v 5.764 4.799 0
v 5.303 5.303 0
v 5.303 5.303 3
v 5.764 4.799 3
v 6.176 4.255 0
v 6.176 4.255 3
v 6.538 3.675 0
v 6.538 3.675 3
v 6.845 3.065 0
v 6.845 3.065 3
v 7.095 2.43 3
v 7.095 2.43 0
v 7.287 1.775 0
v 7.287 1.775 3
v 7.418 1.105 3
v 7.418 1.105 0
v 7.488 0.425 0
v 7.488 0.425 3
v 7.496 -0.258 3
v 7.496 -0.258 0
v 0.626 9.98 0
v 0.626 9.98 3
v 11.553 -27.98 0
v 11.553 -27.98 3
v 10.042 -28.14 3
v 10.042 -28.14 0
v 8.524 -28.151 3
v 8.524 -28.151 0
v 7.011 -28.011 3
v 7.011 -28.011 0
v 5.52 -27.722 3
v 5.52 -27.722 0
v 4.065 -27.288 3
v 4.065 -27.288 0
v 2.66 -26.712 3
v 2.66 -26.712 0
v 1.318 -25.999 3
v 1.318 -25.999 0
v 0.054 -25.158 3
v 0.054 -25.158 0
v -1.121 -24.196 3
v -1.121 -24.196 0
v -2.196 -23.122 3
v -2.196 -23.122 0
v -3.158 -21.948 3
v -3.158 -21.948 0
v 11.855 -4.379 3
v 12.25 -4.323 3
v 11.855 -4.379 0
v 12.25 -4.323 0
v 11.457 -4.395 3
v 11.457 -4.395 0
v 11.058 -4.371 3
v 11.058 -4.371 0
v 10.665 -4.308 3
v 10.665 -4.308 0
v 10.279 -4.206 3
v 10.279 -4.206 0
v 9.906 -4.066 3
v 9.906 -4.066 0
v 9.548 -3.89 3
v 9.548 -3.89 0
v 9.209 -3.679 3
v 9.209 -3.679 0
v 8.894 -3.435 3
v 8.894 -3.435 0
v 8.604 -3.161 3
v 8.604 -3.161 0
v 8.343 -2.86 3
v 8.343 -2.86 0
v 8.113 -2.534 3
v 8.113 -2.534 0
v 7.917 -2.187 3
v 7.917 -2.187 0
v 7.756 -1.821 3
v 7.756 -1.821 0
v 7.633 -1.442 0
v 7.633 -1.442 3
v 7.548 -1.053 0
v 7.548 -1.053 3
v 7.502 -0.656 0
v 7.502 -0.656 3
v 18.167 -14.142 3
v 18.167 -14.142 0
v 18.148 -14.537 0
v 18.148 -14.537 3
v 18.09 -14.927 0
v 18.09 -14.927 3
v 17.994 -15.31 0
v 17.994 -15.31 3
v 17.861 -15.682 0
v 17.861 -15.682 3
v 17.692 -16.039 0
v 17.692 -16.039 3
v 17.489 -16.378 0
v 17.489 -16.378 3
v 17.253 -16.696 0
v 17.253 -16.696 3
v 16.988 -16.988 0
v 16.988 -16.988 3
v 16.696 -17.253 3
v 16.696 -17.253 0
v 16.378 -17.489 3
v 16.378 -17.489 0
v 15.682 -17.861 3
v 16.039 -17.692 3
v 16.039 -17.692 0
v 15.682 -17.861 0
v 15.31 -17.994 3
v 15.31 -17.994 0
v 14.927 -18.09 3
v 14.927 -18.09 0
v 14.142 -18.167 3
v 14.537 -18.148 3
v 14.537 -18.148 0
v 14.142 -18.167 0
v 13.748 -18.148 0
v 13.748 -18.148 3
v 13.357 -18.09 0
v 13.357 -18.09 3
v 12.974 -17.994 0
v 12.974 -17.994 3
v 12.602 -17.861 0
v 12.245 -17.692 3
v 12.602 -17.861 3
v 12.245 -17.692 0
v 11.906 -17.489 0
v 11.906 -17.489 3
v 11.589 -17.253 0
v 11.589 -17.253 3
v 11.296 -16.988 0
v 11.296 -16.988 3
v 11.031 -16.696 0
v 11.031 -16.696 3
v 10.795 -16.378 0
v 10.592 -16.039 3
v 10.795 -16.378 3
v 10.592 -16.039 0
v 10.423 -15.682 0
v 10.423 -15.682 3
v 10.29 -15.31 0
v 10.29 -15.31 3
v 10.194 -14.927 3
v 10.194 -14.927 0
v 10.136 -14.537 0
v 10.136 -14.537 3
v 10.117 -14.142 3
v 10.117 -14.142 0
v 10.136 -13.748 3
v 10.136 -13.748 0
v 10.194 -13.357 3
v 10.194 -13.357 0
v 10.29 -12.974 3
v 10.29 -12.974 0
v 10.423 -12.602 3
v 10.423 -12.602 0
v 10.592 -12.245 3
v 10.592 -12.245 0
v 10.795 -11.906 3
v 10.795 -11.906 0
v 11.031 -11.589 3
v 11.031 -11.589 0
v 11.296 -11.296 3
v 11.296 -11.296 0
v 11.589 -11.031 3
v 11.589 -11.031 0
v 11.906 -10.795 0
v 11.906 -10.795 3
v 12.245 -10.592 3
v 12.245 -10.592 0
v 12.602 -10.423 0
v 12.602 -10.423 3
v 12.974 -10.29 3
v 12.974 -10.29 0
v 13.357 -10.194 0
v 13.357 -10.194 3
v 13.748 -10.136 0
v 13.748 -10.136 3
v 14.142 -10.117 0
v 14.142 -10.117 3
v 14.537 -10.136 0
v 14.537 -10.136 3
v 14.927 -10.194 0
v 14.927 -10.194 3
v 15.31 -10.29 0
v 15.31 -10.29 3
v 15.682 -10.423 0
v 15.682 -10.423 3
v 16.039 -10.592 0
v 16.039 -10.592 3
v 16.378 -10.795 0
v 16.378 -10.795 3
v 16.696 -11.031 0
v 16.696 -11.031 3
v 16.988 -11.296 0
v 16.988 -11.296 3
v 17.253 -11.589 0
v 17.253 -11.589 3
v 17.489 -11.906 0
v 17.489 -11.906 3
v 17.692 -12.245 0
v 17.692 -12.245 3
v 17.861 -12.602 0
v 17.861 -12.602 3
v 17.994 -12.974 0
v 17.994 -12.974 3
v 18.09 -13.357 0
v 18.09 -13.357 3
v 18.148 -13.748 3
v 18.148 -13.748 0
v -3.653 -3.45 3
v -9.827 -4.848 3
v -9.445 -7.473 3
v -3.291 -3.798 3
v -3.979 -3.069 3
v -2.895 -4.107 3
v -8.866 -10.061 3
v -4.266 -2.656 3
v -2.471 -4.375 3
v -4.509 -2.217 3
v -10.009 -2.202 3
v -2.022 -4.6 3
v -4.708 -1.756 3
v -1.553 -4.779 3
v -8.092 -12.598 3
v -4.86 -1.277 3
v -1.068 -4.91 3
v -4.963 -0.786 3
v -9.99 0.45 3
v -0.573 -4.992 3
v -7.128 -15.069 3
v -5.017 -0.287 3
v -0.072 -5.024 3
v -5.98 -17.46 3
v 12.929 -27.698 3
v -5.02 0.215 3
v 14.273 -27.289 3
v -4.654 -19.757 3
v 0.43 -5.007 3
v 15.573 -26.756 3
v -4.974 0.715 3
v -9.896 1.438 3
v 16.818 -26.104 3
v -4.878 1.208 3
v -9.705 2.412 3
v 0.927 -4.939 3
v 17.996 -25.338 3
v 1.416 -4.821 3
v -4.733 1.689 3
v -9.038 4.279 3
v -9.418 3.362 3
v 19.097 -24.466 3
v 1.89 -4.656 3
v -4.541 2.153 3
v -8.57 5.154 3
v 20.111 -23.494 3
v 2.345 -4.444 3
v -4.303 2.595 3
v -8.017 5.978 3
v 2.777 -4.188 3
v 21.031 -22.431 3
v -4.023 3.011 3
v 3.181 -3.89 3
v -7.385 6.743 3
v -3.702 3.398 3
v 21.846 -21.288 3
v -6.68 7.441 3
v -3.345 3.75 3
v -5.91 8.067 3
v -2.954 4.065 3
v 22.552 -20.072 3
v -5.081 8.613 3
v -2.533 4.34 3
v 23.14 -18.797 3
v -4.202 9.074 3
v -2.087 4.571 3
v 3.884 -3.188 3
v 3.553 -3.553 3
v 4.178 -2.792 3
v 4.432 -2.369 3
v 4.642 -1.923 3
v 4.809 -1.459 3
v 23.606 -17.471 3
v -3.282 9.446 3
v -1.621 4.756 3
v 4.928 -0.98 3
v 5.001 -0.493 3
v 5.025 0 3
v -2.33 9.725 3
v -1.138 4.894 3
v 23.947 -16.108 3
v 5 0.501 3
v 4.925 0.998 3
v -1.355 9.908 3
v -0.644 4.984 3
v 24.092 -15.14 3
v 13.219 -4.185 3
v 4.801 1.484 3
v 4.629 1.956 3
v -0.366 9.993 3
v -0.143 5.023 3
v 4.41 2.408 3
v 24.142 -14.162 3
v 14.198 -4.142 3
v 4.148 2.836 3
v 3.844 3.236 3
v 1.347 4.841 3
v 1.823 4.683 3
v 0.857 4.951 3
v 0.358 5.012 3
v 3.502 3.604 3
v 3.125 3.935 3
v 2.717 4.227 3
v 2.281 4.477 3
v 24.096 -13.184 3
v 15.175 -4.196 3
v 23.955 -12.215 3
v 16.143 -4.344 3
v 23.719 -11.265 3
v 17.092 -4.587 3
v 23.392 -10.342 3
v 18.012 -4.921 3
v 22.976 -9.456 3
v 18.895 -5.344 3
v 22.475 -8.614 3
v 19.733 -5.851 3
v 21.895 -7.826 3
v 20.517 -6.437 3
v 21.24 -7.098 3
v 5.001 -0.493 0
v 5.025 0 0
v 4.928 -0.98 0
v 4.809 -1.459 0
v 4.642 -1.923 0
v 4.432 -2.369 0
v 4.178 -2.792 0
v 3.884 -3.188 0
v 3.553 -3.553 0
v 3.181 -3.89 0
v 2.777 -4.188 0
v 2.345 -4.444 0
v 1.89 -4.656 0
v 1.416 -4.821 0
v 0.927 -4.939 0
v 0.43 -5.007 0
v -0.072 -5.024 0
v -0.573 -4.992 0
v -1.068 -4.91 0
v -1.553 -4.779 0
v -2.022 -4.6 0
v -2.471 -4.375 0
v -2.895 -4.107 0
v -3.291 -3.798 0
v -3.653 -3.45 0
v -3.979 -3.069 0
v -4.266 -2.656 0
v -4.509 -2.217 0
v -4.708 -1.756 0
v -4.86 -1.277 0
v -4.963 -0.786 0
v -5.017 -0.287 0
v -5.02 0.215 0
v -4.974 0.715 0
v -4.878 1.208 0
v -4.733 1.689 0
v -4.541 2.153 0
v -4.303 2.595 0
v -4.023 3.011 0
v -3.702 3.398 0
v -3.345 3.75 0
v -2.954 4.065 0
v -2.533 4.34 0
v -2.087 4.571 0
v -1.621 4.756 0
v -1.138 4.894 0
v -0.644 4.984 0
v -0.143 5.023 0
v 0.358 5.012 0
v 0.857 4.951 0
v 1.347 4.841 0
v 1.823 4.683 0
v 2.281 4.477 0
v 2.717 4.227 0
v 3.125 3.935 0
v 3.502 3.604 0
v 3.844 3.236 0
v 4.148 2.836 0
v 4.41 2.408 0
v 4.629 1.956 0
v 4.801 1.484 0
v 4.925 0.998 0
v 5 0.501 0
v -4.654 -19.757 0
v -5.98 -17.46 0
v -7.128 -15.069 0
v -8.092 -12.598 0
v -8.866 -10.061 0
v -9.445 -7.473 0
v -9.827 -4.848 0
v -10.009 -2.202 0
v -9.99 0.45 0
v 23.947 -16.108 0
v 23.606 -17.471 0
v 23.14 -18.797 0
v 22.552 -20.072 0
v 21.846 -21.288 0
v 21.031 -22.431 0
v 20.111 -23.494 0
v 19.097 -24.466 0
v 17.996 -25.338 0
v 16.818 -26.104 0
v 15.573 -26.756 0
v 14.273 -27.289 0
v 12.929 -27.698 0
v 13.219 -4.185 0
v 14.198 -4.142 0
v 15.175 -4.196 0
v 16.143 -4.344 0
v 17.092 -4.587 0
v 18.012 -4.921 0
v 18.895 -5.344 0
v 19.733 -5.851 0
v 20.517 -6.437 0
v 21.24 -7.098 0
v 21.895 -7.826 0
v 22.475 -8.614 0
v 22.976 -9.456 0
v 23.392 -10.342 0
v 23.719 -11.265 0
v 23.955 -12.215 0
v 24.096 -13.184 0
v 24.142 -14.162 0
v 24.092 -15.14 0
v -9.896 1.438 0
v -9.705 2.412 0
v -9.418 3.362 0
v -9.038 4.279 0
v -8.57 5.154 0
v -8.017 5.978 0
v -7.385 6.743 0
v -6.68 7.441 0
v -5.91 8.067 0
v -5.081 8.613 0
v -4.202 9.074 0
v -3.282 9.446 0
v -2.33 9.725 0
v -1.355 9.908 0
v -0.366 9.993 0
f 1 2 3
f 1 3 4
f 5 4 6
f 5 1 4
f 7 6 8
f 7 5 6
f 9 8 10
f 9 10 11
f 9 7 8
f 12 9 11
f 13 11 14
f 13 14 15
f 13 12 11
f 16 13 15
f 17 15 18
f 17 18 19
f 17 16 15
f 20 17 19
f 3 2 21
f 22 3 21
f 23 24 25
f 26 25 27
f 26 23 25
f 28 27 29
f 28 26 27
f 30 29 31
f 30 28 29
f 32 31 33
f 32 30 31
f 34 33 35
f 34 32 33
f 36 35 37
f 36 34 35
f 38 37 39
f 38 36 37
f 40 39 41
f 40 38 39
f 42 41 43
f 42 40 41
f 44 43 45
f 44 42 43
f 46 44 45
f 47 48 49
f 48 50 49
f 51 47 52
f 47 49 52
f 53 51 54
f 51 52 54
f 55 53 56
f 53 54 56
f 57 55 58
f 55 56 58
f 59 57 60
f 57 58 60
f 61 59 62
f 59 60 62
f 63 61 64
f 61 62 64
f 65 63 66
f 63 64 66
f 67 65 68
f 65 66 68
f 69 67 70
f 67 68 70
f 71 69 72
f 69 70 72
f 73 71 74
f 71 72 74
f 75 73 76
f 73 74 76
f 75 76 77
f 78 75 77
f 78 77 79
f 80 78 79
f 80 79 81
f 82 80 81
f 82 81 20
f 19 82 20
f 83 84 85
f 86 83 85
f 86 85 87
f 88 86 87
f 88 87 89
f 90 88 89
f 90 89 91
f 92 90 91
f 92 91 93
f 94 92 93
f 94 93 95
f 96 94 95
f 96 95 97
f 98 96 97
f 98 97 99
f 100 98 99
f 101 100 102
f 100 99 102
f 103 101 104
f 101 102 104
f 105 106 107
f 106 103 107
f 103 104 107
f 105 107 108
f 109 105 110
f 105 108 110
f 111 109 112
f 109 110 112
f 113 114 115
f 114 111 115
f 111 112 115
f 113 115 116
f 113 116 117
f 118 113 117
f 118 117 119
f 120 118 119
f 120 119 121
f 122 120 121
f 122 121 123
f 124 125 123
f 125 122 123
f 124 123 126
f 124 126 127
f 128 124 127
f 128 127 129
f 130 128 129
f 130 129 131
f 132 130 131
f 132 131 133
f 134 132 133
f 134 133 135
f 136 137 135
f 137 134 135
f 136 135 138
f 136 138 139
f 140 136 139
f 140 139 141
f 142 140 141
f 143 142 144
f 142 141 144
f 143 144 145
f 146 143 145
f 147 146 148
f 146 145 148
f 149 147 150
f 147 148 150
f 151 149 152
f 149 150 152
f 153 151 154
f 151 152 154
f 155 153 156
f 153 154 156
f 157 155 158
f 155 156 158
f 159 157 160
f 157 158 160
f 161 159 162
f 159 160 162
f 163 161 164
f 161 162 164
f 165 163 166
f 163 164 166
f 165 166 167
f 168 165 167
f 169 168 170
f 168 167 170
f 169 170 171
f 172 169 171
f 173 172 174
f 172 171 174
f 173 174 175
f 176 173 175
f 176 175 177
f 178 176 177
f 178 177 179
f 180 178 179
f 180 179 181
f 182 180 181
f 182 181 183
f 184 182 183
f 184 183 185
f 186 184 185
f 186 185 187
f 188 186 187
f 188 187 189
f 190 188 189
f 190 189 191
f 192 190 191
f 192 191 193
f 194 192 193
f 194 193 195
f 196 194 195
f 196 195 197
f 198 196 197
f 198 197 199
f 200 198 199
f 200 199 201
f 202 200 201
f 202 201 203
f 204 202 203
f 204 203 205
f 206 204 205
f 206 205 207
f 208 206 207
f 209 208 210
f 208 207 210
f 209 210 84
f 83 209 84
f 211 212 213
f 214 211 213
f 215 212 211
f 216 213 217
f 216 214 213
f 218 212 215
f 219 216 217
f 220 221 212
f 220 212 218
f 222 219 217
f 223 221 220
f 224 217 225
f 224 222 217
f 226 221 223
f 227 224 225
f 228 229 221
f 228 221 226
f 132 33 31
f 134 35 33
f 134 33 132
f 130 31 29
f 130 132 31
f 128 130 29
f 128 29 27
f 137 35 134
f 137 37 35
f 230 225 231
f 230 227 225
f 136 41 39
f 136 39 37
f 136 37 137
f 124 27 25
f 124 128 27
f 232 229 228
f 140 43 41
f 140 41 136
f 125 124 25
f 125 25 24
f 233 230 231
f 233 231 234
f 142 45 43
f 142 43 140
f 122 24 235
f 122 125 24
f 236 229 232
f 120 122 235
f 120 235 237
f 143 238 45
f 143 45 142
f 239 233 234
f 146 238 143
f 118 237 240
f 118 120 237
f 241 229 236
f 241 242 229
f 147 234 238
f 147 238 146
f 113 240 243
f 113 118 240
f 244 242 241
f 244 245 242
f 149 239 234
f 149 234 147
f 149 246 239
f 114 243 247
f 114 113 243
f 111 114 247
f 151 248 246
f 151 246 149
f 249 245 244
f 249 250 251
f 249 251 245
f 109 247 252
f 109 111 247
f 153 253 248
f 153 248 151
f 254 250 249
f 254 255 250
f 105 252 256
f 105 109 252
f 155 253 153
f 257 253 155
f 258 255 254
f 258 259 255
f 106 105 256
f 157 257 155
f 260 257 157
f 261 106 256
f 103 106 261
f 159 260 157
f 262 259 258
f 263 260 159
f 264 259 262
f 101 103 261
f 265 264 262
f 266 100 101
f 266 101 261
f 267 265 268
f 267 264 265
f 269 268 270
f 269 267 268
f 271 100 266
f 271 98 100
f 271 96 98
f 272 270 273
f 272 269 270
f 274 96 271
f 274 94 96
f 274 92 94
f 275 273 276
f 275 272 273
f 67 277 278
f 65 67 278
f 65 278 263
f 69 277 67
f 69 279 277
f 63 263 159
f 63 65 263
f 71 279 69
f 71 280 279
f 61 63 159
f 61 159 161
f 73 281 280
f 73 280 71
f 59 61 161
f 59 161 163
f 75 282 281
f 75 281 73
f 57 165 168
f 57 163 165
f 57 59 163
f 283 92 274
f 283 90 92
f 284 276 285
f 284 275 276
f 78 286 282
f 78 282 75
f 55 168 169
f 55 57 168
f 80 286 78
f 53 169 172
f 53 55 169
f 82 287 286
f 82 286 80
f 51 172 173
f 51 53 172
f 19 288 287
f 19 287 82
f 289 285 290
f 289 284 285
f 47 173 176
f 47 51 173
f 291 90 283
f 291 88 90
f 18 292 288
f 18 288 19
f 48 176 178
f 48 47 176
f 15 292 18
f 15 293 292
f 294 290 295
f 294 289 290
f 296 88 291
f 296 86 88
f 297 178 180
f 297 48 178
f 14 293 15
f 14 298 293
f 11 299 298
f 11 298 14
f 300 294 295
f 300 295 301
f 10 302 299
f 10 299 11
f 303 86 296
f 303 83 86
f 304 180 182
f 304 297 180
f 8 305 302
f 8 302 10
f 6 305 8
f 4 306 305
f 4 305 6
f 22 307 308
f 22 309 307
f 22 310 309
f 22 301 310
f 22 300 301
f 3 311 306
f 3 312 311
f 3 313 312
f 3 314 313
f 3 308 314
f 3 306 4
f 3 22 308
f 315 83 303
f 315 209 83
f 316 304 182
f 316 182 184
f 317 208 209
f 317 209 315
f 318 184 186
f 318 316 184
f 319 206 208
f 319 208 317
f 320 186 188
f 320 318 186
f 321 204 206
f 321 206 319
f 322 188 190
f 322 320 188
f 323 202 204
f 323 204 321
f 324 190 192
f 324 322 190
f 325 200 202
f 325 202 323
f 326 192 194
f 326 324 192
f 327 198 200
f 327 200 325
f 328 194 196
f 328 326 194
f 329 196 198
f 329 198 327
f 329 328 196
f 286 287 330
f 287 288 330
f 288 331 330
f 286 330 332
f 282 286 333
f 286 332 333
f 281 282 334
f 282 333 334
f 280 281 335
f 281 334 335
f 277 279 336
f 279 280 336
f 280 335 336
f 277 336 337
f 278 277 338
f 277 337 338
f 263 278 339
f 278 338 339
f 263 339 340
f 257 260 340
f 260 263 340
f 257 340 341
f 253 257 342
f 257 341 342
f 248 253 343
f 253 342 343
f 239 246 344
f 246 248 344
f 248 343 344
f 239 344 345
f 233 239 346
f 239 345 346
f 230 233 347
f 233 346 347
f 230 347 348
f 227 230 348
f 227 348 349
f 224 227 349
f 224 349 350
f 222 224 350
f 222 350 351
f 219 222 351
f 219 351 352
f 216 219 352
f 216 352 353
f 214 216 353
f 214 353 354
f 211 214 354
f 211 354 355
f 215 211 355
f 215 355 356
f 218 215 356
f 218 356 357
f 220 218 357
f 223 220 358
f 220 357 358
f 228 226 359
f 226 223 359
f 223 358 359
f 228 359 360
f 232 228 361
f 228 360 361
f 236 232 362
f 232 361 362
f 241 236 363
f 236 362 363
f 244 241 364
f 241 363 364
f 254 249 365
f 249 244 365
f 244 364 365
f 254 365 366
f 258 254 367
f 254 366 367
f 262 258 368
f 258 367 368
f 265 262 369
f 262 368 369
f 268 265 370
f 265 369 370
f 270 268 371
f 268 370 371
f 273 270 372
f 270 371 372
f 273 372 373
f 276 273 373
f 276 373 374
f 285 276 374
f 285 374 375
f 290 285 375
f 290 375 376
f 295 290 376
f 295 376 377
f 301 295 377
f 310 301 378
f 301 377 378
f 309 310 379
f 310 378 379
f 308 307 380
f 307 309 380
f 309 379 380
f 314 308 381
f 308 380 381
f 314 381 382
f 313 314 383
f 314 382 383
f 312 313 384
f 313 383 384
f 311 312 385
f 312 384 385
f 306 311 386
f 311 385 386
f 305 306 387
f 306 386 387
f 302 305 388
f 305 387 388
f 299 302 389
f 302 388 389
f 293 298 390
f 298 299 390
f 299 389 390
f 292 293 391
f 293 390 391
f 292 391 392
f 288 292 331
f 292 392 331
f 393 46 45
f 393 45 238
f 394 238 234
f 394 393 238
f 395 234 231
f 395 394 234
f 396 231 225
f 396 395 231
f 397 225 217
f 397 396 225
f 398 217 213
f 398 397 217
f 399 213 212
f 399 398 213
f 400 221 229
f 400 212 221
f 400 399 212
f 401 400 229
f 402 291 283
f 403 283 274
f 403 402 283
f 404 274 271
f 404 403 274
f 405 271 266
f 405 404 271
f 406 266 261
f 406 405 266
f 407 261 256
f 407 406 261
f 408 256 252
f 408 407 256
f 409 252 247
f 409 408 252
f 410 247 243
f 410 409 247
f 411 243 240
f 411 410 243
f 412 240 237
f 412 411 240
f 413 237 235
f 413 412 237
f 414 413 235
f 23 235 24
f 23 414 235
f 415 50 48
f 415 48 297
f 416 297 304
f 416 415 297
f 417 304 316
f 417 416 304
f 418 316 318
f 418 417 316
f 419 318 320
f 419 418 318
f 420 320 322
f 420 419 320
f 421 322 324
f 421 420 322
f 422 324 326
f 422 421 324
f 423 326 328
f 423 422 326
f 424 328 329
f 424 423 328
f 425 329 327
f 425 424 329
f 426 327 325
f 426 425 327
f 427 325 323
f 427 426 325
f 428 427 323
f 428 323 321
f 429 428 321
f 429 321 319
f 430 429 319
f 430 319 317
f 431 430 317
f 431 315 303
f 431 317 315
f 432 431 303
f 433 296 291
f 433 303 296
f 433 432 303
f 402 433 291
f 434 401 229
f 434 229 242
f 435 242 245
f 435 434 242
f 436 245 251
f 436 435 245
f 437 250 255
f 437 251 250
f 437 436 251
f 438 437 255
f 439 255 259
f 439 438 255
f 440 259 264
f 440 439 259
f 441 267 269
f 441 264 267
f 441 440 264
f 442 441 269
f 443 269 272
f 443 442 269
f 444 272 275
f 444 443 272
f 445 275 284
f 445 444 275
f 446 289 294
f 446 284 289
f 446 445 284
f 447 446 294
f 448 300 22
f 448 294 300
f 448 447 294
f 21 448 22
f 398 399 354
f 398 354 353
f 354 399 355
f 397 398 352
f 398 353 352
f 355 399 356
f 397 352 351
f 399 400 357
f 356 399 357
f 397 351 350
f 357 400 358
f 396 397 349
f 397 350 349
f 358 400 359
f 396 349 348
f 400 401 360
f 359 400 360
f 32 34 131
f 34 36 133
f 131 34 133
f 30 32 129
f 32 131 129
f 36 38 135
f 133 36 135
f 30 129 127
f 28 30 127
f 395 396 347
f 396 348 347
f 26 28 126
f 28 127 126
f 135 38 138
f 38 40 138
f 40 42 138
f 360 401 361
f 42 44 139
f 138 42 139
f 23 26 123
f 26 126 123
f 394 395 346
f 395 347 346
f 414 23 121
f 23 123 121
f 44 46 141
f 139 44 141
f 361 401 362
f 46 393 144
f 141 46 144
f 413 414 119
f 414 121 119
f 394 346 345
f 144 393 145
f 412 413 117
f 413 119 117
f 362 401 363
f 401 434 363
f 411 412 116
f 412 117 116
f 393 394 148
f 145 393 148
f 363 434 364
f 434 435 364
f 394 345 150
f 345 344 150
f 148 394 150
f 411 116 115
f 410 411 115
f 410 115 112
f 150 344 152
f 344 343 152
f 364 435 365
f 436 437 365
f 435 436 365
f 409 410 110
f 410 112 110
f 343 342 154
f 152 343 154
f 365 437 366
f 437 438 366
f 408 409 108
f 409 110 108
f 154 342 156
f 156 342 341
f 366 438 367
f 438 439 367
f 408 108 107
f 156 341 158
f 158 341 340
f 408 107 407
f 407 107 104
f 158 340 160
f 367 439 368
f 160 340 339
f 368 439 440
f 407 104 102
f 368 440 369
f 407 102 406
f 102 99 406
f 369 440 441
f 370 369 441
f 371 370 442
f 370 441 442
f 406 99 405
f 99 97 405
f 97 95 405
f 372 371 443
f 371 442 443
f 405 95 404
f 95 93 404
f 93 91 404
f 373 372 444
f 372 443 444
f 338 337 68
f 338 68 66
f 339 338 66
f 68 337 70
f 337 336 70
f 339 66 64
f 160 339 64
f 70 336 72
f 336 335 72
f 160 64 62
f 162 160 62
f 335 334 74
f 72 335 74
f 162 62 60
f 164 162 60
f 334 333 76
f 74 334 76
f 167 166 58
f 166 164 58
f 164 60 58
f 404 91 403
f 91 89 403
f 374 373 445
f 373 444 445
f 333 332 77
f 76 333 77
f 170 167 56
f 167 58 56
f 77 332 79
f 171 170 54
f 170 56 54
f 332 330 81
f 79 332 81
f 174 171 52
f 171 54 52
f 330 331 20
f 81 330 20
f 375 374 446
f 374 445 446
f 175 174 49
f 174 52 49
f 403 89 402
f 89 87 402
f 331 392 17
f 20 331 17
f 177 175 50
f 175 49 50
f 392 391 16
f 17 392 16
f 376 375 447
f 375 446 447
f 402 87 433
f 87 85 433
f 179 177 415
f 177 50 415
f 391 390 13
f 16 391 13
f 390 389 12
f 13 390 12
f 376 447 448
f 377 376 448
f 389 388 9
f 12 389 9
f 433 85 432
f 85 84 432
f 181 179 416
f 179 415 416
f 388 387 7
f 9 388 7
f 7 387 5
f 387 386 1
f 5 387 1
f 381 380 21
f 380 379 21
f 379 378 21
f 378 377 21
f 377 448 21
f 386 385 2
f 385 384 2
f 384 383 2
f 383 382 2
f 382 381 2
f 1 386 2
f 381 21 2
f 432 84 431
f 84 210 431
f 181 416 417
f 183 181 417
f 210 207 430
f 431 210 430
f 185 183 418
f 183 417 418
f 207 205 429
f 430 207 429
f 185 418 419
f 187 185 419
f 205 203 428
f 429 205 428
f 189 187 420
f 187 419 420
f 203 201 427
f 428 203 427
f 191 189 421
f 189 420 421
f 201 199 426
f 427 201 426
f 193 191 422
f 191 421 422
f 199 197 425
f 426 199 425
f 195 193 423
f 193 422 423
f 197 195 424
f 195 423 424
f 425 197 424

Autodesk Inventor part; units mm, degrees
ref_plane "YZ Plane" through (0, 0, 0) normal (1, 0, 0) x (0, 1, 0)
ref_plane "XZ Plane" through (0, 0, 0) normal (0, 1, 0) x (-1, 0, 0)
ref_plane "XY Plane" through (0, 0, 0) normal (0, 0, 1) x (1, 0, 0)
sketch "スケッチ1" plane through (0, 0, 0) normal (0, 0, 1) x (1, 0, 0)
  circle A0 centre (0, 0) radius 5.025
  circle A1 centre (0, 0) radius 10
  line L0 (0, 0) -> (14.1421, -14.1421)
  line L1 (0, 0) -> (20, 0) construction
  line L2 (0, 0) -> (14.1421, -14.1421) construction
  line L3 (-7.0711, -7.0711) -> (7.0711, -21.2132)
  line L4 (21.2132, -7.0711) -> (7.0711, 7.0711)
  arc A2 (7.0711, 7.0711) -> (-7.0711, -7.0711) centre (0, 0) ccw
  arc A3 (7.0711, -21.2132) -> (21.2132, -7.0711) centre (14.1421, -14.1421) ccw
  circle A4 centre (14.1421, -14.1421) radius 4.025
  circle A5 centre (14.1421, -14.1421) radius 13
  circle A6 centre (14.1421, -14.1421) radius 14
  line L5 (4.2426, -24.0416) -> (21.0227, -40.8217)
  line L6 (21.0227, -40.8217) -> (47.0109, -27.2119)
  line L7 (47.0109, -27.2119) -> (24.0416, -4.2426)
  arc A7 (12.0122, -27.9792) -> (10.7234, -30.5224) centre (11.784, -29.4617) ccw
  line L8 (-8.3867, -5.4464) -> (8.8712, -32.0212)
  arc A8 (10.5855, -29.4018) -> (10.585, -29.4134) centre (11.784, -29.4617) ccw
  line L9 (4.2426, -24.0416) -> (21.0227, -40.8217)
  line L10 (21.0227, -40.8217) -> (47.0109, -27.2119)
  line L11 (47.0109, -27.2119) -> (24.0416, -4.2426)
  arc A9 (8.8712, -32.0212) -> (10.7228, -30.5218) centre (9.8758, -31.3688) ccw
  arc A10 (11.5527, -27.9797) -> (10.7228, -30.5218) centre (11.784, -29.4617) ccw
  arc A11 (11.5527, -27.9797) -> (23.9469, -16.1083) centre (9.2397, -13.1591) ccw
  arc A12 (-9.9898, 0.4505) -> (9.3407, -32.4405) centre (24.9746, -1.1263) ccw
  arc A13 (21.2132, -7.0711) -> (7.0711, -21.2132) centre (14.1421, -14.1421) ccw
  arc A14 (7.4956, -0.2576) -> (12.25, -4.3228) centre (11.4932, -0.395) ccw
  circle A15 centre (0, 0) radius 7.5
  line L12 (5.3033, 5.3033) -> (0.6262, 9.9804)
  arc A16 (-3.1585, -21.9475) -> (11.5527, -27.9797) centre (9.1773, -12.8178) ccw
  point P0 (7.0711, -7.0711)
  point P1 (7.0711, 7.0711)
  point P2 (10.4941, -23.453)
  point P3 (-8.3867, -5.4464)
  point P4 (9.5568, -27.6782)
  point P5 (9.5574, -27.6666)
  point P6 (-9.9898, 0.4505)
  point P7 (10.7234, -30.5224)
  point P8 (11.5527, -27.9797)
  point P9 (9.2796, -3.7267)
  point P10 (0.6262, 9.9804)
  dimension "d0" = 10.05
  dimension "d1" = 20
  dimension "d2" = 20
  dimension "d3" = 45
  dimension "d6" = 8.05
  dimension "d7" = 26
  dimension "d8" = 1
  dimension "d9" = 1.5
  dimension "d14" = 0
  dimension "d15" = 0
  dimension "d17" = 15
  dimension "d18" = 168
  dimension "d19" = 35
  dimension "d20" = 4
  dimension "d21" = 15
extrude "押し出し1" add sketch "スケッチ1" along normal blind 3 contours A6 A15 | A6 A15 A5 L0 | L0 A5 A15 A6 | A5 A15 L0 | L0 A15 A5 | A15 A14 A6 | A6 A14 A5 A15 | A15 A5 A1 A6 | A6 A1 L12 A15 | A15 A5 A14 A1 L0 | L0 A1 A5 A15 | A6 L3 A1 | A1 A5 L3 A6 | A13 L3 A5 A1 | A1 A14 A13 | A13 A3 | L3 A6 L5 A16 L8 A1 | L3 A5 A11 A6 | A3 A11 A5 L3 | L8 A16 A12 A1 | A6 A11 A16 L5
properties part number "従動節"
